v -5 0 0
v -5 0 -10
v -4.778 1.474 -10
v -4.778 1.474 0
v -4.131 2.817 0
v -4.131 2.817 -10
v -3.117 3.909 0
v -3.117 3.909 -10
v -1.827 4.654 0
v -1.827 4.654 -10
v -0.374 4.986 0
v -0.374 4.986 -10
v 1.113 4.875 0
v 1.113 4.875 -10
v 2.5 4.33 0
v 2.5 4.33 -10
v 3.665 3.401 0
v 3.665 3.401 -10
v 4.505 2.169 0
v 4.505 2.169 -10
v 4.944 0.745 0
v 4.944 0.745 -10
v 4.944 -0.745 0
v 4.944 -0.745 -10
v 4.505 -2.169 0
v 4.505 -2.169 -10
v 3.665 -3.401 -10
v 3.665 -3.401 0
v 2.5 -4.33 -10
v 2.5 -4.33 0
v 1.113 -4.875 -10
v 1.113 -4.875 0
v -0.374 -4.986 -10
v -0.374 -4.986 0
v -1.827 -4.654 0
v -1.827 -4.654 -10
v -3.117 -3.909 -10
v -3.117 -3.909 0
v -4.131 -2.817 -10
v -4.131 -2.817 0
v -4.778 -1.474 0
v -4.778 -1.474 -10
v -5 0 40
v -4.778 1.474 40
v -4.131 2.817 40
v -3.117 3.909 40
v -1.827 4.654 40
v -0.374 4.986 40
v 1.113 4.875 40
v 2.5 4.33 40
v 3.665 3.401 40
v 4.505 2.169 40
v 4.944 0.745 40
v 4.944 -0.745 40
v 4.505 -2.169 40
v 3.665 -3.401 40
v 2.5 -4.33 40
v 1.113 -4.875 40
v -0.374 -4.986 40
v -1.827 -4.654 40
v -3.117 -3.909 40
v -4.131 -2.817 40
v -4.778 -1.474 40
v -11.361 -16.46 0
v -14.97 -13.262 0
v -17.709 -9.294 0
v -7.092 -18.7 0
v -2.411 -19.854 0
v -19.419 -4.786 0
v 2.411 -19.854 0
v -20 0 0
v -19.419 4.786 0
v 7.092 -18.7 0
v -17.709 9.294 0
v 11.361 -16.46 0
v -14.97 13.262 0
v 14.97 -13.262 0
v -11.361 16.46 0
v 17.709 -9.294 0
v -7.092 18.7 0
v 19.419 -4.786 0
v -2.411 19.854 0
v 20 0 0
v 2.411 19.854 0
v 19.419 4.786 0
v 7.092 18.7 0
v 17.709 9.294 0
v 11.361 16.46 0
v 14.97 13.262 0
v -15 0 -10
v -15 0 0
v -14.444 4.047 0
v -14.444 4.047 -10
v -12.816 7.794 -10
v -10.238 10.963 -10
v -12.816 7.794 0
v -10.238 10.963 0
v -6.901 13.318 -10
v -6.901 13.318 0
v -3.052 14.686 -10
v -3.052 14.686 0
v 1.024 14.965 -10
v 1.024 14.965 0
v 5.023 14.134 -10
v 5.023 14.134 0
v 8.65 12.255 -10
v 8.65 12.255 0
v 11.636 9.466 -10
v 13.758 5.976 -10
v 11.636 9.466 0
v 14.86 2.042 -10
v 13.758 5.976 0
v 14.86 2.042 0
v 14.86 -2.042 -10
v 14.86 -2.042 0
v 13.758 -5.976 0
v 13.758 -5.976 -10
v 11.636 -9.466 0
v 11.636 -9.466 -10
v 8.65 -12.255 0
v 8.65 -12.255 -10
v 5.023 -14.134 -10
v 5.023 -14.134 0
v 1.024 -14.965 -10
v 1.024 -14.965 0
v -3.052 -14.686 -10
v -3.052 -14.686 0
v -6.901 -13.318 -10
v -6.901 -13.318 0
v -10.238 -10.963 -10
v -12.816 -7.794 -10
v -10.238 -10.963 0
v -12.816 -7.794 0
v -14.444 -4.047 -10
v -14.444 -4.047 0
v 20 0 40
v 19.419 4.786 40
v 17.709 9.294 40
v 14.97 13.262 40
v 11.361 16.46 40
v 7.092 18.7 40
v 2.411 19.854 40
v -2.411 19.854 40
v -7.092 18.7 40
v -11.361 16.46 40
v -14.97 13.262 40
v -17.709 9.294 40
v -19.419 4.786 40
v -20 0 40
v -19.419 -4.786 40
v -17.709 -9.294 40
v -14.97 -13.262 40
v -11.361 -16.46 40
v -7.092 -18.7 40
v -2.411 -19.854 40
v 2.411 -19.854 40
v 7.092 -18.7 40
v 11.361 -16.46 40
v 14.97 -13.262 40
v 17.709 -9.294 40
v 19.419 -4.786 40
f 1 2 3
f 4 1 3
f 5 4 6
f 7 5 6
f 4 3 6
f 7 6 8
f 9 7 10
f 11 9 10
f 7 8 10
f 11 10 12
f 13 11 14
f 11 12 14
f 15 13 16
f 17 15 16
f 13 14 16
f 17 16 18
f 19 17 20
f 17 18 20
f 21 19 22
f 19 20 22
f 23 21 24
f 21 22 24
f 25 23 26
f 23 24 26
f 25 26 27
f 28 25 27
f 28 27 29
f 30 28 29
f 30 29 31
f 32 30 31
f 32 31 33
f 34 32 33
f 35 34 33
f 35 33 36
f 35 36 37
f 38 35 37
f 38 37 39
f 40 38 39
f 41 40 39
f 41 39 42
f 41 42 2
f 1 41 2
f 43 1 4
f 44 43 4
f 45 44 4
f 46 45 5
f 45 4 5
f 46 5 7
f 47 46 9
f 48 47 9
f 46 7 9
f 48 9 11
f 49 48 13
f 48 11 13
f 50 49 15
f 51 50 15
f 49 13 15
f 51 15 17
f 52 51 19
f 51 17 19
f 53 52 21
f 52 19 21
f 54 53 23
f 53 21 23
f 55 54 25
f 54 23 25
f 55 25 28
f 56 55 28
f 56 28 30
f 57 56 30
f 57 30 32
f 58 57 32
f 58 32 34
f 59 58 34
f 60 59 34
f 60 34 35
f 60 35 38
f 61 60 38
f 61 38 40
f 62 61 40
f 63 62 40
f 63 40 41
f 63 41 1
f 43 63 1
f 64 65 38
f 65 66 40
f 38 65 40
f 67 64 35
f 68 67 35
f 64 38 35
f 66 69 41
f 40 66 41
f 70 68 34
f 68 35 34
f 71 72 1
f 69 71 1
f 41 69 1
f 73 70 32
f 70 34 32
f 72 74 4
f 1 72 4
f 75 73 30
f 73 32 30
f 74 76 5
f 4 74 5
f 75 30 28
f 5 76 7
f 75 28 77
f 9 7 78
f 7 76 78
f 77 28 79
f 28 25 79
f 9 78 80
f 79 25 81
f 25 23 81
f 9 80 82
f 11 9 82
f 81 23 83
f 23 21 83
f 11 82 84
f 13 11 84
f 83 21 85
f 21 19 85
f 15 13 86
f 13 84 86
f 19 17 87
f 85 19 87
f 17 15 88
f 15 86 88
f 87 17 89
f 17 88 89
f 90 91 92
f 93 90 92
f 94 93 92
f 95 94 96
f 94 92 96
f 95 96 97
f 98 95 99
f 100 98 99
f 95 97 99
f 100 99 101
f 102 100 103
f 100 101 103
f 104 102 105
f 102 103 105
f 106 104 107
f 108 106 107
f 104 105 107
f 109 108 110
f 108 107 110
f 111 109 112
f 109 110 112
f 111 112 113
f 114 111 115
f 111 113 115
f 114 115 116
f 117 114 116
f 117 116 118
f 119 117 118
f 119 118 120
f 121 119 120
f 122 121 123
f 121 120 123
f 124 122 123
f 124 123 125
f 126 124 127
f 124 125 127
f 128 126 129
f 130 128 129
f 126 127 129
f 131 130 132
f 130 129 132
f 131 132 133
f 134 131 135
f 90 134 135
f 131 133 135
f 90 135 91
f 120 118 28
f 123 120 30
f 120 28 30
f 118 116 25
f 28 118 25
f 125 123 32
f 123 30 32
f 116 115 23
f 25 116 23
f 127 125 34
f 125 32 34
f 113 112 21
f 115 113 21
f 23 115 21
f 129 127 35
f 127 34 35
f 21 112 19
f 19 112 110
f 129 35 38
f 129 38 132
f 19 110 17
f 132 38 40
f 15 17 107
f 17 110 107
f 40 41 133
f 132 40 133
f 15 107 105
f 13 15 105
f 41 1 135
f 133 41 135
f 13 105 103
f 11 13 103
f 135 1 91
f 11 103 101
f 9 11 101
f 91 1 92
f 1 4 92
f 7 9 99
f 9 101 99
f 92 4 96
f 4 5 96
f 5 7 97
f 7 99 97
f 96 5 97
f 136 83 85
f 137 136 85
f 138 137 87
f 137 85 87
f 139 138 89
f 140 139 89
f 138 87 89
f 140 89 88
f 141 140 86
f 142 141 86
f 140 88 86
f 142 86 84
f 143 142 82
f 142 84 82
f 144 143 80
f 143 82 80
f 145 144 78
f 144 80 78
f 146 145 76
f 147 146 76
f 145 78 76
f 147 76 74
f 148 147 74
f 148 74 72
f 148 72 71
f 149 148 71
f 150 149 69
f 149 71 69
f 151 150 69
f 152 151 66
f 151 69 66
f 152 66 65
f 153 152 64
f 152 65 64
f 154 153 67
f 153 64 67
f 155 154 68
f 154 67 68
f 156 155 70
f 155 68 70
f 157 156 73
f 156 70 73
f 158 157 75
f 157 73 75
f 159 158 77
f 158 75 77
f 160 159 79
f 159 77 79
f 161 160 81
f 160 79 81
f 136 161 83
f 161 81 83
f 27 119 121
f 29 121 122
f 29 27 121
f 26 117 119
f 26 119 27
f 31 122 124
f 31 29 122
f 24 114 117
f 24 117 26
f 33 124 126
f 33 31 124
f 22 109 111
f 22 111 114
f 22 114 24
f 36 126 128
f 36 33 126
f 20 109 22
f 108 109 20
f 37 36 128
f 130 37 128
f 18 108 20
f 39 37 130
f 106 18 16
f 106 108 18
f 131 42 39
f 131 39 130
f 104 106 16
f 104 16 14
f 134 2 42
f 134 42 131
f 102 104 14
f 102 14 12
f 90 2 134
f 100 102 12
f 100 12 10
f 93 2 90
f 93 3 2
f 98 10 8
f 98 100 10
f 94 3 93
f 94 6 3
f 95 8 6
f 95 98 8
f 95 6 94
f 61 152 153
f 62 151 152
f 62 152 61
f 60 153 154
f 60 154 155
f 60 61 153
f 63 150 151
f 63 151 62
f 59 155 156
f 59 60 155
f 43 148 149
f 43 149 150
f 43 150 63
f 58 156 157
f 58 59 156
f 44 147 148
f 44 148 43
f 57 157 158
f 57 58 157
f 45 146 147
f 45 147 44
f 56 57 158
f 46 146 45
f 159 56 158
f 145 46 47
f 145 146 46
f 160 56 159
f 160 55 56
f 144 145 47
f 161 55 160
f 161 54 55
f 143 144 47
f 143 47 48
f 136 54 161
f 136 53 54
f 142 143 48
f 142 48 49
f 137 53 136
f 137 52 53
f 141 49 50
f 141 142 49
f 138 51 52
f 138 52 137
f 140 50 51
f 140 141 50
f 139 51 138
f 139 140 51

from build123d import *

# Parameters (mm, degrees)
SKETCH_1_R          = 20
EXTRUDE_1_DEPTH     = 40
SKETCH_2_R          = 15
EXTRUDE_2_DEPTH     = 10
SKETCH_3_R          = 5
CUT_EXTRUDE_1_DEPTH = 50


with BuildPart() as part:
    # 草图1 → 凸台-拉伸1 (new body)
    with BuildSketch(Plane.XY):
        Circle(SKETCH_1_R)
    extrude(amount=EXTRUDE_1_DEPTH)


with BuildPart() as body_2:
    # 草图2 → 凸台-拉伸2 (new body)
    with BuildSketch(Plane(origin=(0, 0, 0), x_dir=(-1, 0, 0), z_dir=(0, 0, -1))):
        Circle(SKETCH_2_R)
    extrude(amount=EXTRUDE_2_DEPTH)


with BuildPart() as cut_extrude_1_tool:
    # 草图3 → 切除-拉伸1 (new body)
    with BuildSketch(Plane(origin=(0, 0, -10), x_dir=(-1, 0, 0), z_dir=(0, 0, -1))):
        Circle(SKETCH_3_R)
    extrude(amount=-CUT_EXTRUDE_1_DEPTH)


with BuildPart() as part_1:
    add(part.part)

    # 切除-拉伸1: cut by cut_extrude_1_tool
    add(cut_extrude_1_tool.part, mode=Mode.SUBTRACT)


with BuildPart() as body_2_1:
    add(body_2.part)

    # 切除-拉伸1: cut by cut_extrude_1_tool
    add(cut_extrude_1_tool.part, mode=Mode.SUBTRACT)


solid = Compound([part_1.part, body_2_1.part])
